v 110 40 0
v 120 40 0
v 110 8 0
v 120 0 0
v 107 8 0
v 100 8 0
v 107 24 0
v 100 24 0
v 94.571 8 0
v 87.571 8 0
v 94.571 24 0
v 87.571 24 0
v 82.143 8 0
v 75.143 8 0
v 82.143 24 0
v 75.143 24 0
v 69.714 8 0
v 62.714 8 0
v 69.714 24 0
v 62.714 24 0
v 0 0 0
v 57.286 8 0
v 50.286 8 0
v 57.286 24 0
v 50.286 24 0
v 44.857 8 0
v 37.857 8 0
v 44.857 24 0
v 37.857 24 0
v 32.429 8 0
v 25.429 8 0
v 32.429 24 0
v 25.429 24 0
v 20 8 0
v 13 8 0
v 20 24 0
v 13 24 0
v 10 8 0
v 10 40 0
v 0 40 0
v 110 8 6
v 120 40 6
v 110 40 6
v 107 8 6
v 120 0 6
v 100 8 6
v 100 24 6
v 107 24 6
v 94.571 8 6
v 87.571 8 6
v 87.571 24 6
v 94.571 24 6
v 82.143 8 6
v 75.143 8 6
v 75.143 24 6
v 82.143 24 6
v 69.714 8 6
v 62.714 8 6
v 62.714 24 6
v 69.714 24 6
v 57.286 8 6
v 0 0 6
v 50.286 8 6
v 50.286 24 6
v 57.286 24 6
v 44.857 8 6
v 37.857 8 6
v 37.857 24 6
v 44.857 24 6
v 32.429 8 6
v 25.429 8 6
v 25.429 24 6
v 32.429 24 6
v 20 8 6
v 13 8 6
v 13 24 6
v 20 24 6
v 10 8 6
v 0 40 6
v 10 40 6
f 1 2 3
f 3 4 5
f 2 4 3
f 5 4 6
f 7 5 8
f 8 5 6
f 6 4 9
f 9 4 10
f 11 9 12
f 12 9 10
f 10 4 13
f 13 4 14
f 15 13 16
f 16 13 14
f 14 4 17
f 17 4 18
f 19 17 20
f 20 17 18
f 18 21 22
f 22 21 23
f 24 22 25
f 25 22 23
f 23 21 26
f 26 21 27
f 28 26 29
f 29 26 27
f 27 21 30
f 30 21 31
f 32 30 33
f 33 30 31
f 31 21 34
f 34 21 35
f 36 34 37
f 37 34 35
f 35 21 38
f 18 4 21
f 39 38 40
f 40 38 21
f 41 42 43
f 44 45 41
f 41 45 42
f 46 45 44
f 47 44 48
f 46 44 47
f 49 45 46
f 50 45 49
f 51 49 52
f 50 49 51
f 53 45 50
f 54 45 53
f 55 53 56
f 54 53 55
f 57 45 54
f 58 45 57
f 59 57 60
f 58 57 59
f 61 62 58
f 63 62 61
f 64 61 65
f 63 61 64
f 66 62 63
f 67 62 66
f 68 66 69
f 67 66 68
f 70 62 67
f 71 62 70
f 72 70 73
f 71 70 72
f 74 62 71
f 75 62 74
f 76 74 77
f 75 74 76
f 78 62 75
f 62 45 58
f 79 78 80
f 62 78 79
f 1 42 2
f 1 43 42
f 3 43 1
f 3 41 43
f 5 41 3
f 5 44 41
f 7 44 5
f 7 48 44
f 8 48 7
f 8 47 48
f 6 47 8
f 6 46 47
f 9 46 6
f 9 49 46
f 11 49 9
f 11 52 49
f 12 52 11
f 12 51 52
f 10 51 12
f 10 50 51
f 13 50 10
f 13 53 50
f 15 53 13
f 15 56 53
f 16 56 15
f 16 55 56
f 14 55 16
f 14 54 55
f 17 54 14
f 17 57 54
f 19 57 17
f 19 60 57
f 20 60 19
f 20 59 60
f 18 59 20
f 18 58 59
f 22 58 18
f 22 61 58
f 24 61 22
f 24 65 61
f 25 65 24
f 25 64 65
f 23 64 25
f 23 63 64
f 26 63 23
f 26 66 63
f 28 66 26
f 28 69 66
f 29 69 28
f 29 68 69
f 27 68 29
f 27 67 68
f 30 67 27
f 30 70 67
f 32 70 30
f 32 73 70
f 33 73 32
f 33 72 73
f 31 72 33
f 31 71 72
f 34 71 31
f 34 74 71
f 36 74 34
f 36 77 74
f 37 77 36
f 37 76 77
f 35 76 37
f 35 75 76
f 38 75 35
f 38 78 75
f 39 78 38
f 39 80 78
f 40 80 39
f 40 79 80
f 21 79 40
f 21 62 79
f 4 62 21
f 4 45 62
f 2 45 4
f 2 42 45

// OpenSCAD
$fn = 32;

// ----------------------------------------------------------------------
// Guard grille: 8 slats over a 120 x 40 mm plate
// ----------------------------------------------------------------------

// --- parameters (mm) ---
profile_height = 6;       // extrusion height
profile_points = 40;      // points of the closed outline

profile = [[0, 0], [120, 0], [120, 40], [110, 40], [110, 8], [107, 8], [107, 24], [100, 24], [100, 8], [94.571, 8], [94.571, 24], [87.571, 24], [87.571, 8], [82.143, 8], [82.143, 24], [75.143, 24], [75.143, 8], [69.714, 8], [69.714, 24], [62.714, 24], [62.714, 8], [57.286, 8], [57.286, 24], [50.286, 24], [50.286, 8], [44.857, 8], [44.857, 24], [37.857, 24], [37.857, 8], [32.429, 8], [32.429, 24], [25.429, 24], [25.429, 8], [20, 8], [20, 24], [13, 24], [13, 8], [10, 8], [10, 40], [0, 40]];  // single closed polygon, 40 points, counter clockwise

// --- the one profile operation ---
linear_extrude(height = profile_height) polygon(points = profile);
